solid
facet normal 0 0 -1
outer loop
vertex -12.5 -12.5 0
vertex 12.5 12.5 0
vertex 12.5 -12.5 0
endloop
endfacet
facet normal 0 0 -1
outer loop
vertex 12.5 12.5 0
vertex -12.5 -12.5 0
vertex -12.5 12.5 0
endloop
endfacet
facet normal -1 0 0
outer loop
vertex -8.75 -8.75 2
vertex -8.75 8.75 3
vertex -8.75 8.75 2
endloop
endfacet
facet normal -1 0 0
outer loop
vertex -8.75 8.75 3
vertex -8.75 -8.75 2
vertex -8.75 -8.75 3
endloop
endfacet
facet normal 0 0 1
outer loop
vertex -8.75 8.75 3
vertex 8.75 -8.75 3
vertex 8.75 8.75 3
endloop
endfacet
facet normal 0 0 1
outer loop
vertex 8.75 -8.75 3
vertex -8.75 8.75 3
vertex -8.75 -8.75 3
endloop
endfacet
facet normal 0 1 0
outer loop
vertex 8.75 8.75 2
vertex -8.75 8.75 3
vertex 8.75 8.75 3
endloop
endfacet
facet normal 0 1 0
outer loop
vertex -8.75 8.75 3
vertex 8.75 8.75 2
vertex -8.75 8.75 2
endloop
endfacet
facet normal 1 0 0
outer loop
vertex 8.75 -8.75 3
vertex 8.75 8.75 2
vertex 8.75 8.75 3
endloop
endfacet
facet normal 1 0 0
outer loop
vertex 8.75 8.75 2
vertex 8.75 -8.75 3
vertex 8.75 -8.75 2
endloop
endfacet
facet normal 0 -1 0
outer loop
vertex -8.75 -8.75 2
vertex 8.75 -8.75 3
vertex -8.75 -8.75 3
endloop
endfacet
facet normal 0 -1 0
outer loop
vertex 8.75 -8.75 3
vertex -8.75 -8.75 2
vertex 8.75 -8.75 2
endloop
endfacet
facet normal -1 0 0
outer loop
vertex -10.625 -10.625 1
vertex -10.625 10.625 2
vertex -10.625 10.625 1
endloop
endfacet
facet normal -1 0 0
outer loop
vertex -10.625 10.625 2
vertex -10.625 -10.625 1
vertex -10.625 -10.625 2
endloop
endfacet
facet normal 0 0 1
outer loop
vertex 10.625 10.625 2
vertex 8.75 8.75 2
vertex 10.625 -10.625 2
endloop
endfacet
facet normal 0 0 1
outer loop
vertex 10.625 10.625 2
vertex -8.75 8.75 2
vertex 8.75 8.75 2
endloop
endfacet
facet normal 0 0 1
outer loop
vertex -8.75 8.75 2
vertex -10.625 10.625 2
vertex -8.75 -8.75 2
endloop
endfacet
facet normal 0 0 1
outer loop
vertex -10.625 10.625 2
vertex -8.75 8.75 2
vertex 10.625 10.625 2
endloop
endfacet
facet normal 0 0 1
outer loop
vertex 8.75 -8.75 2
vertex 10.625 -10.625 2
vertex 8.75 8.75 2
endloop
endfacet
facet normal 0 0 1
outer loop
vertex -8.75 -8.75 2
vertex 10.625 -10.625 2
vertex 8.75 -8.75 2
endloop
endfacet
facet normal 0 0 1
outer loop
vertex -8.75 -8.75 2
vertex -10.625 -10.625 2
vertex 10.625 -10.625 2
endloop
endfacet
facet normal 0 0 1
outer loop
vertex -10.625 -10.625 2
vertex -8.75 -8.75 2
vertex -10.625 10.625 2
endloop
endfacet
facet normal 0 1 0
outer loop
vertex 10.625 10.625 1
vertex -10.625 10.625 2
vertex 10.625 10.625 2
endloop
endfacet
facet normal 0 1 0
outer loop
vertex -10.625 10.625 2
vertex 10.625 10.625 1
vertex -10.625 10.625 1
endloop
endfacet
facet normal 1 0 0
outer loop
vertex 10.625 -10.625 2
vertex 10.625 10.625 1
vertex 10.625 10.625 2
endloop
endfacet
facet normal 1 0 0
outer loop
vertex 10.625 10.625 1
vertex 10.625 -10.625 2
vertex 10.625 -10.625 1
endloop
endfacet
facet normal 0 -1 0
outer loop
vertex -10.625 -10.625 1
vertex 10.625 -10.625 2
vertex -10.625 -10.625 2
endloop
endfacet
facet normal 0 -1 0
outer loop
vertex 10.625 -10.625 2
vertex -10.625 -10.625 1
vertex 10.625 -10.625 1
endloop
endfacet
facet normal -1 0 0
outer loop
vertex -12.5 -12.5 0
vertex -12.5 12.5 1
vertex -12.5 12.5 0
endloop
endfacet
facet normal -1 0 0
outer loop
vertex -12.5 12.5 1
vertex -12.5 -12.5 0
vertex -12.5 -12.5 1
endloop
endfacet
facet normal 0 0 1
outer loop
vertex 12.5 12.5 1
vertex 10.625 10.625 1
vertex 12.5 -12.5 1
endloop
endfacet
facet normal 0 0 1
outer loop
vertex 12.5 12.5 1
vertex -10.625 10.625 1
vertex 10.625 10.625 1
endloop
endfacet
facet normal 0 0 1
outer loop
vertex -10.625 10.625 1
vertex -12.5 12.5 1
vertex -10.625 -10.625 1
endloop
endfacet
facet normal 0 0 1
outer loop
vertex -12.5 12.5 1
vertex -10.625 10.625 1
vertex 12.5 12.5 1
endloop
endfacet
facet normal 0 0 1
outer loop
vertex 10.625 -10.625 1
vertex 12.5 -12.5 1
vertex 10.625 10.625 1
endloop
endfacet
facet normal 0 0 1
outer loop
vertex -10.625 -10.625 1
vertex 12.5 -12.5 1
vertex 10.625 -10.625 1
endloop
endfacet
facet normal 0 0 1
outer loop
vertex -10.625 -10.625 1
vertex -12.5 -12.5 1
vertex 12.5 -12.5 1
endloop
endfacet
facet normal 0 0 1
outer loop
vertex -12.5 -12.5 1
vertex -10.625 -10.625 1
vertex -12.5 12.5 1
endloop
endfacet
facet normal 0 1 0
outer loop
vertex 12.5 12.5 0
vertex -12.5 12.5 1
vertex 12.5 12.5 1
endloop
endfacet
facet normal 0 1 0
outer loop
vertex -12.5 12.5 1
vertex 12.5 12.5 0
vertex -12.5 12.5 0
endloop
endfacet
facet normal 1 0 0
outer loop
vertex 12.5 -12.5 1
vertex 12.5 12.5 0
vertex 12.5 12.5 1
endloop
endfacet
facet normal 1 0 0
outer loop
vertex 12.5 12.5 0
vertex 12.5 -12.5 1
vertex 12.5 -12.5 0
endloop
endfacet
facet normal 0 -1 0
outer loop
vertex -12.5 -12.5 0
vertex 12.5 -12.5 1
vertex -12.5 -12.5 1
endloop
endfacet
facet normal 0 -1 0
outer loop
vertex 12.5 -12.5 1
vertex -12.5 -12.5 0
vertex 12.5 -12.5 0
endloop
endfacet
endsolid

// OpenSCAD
base_side_length=25;

module ut_logo(height) { color("#ff00ff")
    translate([-34.3,-36.8,0]) linear_extrude(height=height,scale=(1)) import("C:\\Users\\reece\\Downloads\\utsmash_medals\\logo_circle_print.dxf");
}

module trophy_base(height, length){
    linear_extrude(height=3*height) square(size = 0.7*length, center=true);
    linear_extrude(height=2*height) square(size = 0.85*length, center=true);
    linear_extrude(height=height) square(length, center=true);
}

module spiral(){
    linear_extrude(height=20, twist=100) polygon(base_side_length/2);
    
}

/*module spiral(){
    intersection(){
	translate([0,0,75])  //reposition to match spiral
		scale([.5,.5,1.5]){ //scale to match spiral
			difference(){ 
				//creates the hollow bounding shape
				#sphere(d=100);
					sphere(d=80);}}
linear_extrude(150,twist=360,slices=300) //spiral
	square([60,20],center=true);}
cylinder(d1=60,d2=35,h=20); //base
}*/

trophy_base(1, base_side_length);
spiral();
